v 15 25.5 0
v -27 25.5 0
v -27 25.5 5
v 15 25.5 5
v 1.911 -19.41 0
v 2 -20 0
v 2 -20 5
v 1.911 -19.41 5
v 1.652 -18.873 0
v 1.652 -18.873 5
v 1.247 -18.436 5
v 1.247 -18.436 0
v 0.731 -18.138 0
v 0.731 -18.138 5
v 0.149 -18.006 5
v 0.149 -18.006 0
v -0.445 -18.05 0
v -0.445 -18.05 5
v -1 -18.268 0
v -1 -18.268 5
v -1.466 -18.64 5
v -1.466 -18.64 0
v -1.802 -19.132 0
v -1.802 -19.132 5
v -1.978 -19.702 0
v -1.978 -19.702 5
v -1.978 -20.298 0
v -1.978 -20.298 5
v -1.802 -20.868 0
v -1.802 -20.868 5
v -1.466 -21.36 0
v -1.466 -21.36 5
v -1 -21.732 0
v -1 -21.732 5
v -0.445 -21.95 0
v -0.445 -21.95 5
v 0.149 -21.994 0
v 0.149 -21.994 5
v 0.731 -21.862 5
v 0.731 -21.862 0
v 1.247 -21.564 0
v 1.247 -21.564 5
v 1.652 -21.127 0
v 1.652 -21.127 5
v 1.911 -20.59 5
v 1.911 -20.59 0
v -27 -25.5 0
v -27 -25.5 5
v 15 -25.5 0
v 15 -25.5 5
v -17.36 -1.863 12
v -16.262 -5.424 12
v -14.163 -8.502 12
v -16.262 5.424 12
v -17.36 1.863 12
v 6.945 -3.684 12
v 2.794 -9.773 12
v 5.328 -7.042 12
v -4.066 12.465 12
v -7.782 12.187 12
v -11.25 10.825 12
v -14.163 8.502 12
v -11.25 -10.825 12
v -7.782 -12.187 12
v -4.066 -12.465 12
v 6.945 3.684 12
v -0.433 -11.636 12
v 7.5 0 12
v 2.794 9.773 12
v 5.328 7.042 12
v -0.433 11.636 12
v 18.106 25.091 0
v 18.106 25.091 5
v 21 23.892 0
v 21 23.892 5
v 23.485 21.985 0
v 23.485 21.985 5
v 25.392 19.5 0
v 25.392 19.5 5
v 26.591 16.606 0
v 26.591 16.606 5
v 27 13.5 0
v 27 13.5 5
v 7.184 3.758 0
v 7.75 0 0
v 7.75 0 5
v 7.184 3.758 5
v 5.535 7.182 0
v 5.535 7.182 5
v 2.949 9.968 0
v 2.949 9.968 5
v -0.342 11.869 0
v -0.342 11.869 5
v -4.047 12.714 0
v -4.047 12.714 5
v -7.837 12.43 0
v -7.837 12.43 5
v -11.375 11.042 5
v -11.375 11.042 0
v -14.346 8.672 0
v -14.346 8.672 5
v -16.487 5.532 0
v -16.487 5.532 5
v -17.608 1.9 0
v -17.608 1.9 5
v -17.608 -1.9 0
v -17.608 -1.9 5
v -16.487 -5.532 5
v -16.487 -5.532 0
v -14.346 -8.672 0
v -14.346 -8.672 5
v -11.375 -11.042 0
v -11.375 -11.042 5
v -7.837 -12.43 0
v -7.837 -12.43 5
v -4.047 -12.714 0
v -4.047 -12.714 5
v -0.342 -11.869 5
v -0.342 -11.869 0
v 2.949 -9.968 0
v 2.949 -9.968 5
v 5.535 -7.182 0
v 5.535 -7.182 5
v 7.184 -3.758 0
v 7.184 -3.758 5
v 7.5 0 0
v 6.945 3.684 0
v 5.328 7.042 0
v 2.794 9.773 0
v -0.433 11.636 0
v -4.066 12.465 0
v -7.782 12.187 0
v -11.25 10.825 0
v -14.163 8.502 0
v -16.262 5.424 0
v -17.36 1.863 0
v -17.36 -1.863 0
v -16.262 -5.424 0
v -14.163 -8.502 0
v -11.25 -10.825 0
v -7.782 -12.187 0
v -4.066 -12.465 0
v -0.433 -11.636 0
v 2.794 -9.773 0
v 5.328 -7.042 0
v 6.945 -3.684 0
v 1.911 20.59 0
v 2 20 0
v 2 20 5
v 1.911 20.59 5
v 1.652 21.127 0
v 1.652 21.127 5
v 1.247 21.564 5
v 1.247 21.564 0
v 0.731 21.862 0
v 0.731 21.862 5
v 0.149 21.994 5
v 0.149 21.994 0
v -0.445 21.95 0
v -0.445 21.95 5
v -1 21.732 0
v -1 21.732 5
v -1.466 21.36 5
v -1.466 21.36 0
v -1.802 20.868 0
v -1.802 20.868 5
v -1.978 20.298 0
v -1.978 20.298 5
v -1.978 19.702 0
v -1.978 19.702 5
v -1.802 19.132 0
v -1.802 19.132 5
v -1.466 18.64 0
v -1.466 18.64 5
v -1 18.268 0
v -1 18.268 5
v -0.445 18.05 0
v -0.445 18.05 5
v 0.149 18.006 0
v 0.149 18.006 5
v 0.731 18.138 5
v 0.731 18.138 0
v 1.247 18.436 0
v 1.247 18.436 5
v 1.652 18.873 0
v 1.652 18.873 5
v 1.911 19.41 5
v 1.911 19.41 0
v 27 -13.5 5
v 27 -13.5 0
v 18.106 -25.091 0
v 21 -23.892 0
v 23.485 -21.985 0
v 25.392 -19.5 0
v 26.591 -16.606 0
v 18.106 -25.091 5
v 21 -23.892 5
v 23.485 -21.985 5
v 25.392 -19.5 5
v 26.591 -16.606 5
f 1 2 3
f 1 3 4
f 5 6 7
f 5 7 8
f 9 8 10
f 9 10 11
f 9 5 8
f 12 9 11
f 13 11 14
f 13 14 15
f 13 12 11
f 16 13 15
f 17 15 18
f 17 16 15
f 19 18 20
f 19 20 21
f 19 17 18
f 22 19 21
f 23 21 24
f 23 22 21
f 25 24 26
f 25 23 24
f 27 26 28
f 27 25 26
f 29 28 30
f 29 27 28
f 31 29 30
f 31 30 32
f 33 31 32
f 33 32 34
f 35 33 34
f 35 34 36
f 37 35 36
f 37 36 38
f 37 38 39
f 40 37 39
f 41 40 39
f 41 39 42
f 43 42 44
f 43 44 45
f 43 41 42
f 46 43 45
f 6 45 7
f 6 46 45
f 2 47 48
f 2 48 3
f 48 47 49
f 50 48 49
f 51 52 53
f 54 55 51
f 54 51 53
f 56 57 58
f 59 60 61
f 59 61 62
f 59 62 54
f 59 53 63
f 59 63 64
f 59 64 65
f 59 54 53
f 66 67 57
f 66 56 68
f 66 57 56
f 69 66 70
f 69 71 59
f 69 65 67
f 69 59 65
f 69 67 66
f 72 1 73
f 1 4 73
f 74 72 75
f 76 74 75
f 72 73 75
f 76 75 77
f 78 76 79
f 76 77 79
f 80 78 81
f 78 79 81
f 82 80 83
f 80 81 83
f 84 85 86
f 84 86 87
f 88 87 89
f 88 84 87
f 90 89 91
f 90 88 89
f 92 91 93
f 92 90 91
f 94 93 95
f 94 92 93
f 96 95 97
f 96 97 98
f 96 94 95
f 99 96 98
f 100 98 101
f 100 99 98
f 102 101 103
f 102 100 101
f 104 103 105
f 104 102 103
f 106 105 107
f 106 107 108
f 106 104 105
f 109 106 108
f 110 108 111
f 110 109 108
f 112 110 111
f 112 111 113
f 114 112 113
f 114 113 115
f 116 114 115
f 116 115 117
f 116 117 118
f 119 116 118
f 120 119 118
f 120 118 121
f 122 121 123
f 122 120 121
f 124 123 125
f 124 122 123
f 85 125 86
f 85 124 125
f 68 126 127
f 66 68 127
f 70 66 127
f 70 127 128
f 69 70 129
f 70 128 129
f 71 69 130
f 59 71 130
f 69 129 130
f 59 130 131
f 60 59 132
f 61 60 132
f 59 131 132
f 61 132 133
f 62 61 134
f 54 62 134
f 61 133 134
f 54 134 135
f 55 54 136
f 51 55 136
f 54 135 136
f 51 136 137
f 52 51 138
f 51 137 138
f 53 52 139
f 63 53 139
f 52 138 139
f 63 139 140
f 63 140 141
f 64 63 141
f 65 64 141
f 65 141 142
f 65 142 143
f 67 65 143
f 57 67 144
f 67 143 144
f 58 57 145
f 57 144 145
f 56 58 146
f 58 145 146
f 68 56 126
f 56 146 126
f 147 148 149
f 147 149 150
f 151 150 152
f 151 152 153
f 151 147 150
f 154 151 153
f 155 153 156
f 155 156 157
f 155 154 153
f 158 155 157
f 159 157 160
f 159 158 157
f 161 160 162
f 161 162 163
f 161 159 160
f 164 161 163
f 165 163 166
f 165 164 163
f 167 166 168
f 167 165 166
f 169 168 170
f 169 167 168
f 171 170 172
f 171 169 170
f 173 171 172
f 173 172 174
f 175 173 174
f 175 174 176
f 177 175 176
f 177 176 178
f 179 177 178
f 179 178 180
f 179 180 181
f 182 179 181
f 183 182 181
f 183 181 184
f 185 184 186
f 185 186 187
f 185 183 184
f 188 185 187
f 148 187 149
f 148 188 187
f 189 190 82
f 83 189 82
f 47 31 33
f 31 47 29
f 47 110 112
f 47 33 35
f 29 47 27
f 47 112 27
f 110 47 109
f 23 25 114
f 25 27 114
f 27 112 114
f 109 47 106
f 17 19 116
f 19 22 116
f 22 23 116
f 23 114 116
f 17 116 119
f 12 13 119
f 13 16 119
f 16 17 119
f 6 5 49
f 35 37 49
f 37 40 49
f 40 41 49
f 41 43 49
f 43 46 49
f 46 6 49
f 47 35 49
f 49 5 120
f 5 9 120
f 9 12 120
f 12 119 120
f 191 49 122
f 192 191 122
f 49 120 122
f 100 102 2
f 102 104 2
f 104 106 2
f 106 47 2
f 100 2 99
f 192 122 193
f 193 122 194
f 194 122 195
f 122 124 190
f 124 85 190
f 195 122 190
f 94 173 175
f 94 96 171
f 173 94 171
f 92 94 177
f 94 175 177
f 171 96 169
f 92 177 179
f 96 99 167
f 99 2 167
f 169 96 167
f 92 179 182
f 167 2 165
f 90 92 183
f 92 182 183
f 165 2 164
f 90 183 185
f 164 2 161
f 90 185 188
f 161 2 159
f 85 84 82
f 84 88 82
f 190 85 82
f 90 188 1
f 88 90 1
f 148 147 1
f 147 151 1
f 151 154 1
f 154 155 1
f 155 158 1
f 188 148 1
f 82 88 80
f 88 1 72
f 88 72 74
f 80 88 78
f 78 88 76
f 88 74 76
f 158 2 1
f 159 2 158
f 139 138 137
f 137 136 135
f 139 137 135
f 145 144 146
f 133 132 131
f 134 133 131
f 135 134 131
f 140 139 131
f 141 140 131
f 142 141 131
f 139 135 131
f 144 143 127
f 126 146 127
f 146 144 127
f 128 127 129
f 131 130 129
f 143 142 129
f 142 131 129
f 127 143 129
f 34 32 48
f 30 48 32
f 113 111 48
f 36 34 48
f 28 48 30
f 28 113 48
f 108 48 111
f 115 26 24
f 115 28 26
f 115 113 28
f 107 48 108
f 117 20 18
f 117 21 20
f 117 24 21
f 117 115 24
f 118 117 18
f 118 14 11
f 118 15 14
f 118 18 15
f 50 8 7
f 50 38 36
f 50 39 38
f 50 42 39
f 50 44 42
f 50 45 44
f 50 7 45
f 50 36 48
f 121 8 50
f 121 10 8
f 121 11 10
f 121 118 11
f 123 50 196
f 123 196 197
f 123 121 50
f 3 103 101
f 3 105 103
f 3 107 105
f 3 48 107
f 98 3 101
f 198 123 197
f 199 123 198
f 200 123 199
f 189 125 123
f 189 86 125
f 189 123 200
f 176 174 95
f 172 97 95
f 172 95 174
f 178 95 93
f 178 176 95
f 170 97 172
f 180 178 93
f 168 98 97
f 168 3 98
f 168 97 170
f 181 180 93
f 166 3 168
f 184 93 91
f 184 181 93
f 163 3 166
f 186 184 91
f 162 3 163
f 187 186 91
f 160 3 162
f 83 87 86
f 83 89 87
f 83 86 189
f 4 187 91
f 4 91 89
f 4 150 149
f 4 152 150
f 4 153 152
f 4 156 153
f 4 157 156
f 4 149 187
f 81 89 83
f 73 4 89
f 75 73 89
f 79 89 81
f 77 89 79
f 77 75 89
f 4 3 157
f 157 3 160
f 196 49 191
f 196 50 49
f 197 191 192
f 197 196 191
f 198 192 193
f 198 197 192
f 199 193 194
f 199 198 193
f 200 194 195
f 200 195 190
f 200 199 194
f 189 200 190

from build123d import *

# Parameters (mm, degrees)
F0_W     = 54
F0_H     = 51
F0_R     = 2
F0_R_2   = 12.75
F1_DEPTH = 5
F2_R     = 12
F3_R     = 12.5
F4_DEPTH = 12


with BuildPart() as f1:
    # F0 (on Top) → F1 (new body)
    with BuildSketch(Plane.XY):
        Rectangle(F0_W, F0_H)
        with Locations((0, -20)):
            Circle(F0_R, mode=Mode.SUBTRACT)
        with Locations((-5, 0)):
            Circle(F0_R_2, mode=Mode.SUBTRACT)
        with Locations((0, 20)):
            Circle(F0_R, mode=Mode.SUBTRACT)
    extrude(amount=F1_DEPTH)

    # F2
    f2_edges = [f1.edges().sort_by_distance(p)[0] for p in [
        (27, -25.5, 2.5),
        (27, 25.5, 2.5),
    ]]
    fillet(f2_edges, radius=F2_R)


with BuildPart() as f4:
    # F3 (on Top) → F4 (new body)
    with BuildSketch(Plane.XY):
        with Locations((-5, 0)):
            Circle(F3_R)
    extrude(amount=F4_DEPTH)


solid = Compound([f1.part, f4.part])
